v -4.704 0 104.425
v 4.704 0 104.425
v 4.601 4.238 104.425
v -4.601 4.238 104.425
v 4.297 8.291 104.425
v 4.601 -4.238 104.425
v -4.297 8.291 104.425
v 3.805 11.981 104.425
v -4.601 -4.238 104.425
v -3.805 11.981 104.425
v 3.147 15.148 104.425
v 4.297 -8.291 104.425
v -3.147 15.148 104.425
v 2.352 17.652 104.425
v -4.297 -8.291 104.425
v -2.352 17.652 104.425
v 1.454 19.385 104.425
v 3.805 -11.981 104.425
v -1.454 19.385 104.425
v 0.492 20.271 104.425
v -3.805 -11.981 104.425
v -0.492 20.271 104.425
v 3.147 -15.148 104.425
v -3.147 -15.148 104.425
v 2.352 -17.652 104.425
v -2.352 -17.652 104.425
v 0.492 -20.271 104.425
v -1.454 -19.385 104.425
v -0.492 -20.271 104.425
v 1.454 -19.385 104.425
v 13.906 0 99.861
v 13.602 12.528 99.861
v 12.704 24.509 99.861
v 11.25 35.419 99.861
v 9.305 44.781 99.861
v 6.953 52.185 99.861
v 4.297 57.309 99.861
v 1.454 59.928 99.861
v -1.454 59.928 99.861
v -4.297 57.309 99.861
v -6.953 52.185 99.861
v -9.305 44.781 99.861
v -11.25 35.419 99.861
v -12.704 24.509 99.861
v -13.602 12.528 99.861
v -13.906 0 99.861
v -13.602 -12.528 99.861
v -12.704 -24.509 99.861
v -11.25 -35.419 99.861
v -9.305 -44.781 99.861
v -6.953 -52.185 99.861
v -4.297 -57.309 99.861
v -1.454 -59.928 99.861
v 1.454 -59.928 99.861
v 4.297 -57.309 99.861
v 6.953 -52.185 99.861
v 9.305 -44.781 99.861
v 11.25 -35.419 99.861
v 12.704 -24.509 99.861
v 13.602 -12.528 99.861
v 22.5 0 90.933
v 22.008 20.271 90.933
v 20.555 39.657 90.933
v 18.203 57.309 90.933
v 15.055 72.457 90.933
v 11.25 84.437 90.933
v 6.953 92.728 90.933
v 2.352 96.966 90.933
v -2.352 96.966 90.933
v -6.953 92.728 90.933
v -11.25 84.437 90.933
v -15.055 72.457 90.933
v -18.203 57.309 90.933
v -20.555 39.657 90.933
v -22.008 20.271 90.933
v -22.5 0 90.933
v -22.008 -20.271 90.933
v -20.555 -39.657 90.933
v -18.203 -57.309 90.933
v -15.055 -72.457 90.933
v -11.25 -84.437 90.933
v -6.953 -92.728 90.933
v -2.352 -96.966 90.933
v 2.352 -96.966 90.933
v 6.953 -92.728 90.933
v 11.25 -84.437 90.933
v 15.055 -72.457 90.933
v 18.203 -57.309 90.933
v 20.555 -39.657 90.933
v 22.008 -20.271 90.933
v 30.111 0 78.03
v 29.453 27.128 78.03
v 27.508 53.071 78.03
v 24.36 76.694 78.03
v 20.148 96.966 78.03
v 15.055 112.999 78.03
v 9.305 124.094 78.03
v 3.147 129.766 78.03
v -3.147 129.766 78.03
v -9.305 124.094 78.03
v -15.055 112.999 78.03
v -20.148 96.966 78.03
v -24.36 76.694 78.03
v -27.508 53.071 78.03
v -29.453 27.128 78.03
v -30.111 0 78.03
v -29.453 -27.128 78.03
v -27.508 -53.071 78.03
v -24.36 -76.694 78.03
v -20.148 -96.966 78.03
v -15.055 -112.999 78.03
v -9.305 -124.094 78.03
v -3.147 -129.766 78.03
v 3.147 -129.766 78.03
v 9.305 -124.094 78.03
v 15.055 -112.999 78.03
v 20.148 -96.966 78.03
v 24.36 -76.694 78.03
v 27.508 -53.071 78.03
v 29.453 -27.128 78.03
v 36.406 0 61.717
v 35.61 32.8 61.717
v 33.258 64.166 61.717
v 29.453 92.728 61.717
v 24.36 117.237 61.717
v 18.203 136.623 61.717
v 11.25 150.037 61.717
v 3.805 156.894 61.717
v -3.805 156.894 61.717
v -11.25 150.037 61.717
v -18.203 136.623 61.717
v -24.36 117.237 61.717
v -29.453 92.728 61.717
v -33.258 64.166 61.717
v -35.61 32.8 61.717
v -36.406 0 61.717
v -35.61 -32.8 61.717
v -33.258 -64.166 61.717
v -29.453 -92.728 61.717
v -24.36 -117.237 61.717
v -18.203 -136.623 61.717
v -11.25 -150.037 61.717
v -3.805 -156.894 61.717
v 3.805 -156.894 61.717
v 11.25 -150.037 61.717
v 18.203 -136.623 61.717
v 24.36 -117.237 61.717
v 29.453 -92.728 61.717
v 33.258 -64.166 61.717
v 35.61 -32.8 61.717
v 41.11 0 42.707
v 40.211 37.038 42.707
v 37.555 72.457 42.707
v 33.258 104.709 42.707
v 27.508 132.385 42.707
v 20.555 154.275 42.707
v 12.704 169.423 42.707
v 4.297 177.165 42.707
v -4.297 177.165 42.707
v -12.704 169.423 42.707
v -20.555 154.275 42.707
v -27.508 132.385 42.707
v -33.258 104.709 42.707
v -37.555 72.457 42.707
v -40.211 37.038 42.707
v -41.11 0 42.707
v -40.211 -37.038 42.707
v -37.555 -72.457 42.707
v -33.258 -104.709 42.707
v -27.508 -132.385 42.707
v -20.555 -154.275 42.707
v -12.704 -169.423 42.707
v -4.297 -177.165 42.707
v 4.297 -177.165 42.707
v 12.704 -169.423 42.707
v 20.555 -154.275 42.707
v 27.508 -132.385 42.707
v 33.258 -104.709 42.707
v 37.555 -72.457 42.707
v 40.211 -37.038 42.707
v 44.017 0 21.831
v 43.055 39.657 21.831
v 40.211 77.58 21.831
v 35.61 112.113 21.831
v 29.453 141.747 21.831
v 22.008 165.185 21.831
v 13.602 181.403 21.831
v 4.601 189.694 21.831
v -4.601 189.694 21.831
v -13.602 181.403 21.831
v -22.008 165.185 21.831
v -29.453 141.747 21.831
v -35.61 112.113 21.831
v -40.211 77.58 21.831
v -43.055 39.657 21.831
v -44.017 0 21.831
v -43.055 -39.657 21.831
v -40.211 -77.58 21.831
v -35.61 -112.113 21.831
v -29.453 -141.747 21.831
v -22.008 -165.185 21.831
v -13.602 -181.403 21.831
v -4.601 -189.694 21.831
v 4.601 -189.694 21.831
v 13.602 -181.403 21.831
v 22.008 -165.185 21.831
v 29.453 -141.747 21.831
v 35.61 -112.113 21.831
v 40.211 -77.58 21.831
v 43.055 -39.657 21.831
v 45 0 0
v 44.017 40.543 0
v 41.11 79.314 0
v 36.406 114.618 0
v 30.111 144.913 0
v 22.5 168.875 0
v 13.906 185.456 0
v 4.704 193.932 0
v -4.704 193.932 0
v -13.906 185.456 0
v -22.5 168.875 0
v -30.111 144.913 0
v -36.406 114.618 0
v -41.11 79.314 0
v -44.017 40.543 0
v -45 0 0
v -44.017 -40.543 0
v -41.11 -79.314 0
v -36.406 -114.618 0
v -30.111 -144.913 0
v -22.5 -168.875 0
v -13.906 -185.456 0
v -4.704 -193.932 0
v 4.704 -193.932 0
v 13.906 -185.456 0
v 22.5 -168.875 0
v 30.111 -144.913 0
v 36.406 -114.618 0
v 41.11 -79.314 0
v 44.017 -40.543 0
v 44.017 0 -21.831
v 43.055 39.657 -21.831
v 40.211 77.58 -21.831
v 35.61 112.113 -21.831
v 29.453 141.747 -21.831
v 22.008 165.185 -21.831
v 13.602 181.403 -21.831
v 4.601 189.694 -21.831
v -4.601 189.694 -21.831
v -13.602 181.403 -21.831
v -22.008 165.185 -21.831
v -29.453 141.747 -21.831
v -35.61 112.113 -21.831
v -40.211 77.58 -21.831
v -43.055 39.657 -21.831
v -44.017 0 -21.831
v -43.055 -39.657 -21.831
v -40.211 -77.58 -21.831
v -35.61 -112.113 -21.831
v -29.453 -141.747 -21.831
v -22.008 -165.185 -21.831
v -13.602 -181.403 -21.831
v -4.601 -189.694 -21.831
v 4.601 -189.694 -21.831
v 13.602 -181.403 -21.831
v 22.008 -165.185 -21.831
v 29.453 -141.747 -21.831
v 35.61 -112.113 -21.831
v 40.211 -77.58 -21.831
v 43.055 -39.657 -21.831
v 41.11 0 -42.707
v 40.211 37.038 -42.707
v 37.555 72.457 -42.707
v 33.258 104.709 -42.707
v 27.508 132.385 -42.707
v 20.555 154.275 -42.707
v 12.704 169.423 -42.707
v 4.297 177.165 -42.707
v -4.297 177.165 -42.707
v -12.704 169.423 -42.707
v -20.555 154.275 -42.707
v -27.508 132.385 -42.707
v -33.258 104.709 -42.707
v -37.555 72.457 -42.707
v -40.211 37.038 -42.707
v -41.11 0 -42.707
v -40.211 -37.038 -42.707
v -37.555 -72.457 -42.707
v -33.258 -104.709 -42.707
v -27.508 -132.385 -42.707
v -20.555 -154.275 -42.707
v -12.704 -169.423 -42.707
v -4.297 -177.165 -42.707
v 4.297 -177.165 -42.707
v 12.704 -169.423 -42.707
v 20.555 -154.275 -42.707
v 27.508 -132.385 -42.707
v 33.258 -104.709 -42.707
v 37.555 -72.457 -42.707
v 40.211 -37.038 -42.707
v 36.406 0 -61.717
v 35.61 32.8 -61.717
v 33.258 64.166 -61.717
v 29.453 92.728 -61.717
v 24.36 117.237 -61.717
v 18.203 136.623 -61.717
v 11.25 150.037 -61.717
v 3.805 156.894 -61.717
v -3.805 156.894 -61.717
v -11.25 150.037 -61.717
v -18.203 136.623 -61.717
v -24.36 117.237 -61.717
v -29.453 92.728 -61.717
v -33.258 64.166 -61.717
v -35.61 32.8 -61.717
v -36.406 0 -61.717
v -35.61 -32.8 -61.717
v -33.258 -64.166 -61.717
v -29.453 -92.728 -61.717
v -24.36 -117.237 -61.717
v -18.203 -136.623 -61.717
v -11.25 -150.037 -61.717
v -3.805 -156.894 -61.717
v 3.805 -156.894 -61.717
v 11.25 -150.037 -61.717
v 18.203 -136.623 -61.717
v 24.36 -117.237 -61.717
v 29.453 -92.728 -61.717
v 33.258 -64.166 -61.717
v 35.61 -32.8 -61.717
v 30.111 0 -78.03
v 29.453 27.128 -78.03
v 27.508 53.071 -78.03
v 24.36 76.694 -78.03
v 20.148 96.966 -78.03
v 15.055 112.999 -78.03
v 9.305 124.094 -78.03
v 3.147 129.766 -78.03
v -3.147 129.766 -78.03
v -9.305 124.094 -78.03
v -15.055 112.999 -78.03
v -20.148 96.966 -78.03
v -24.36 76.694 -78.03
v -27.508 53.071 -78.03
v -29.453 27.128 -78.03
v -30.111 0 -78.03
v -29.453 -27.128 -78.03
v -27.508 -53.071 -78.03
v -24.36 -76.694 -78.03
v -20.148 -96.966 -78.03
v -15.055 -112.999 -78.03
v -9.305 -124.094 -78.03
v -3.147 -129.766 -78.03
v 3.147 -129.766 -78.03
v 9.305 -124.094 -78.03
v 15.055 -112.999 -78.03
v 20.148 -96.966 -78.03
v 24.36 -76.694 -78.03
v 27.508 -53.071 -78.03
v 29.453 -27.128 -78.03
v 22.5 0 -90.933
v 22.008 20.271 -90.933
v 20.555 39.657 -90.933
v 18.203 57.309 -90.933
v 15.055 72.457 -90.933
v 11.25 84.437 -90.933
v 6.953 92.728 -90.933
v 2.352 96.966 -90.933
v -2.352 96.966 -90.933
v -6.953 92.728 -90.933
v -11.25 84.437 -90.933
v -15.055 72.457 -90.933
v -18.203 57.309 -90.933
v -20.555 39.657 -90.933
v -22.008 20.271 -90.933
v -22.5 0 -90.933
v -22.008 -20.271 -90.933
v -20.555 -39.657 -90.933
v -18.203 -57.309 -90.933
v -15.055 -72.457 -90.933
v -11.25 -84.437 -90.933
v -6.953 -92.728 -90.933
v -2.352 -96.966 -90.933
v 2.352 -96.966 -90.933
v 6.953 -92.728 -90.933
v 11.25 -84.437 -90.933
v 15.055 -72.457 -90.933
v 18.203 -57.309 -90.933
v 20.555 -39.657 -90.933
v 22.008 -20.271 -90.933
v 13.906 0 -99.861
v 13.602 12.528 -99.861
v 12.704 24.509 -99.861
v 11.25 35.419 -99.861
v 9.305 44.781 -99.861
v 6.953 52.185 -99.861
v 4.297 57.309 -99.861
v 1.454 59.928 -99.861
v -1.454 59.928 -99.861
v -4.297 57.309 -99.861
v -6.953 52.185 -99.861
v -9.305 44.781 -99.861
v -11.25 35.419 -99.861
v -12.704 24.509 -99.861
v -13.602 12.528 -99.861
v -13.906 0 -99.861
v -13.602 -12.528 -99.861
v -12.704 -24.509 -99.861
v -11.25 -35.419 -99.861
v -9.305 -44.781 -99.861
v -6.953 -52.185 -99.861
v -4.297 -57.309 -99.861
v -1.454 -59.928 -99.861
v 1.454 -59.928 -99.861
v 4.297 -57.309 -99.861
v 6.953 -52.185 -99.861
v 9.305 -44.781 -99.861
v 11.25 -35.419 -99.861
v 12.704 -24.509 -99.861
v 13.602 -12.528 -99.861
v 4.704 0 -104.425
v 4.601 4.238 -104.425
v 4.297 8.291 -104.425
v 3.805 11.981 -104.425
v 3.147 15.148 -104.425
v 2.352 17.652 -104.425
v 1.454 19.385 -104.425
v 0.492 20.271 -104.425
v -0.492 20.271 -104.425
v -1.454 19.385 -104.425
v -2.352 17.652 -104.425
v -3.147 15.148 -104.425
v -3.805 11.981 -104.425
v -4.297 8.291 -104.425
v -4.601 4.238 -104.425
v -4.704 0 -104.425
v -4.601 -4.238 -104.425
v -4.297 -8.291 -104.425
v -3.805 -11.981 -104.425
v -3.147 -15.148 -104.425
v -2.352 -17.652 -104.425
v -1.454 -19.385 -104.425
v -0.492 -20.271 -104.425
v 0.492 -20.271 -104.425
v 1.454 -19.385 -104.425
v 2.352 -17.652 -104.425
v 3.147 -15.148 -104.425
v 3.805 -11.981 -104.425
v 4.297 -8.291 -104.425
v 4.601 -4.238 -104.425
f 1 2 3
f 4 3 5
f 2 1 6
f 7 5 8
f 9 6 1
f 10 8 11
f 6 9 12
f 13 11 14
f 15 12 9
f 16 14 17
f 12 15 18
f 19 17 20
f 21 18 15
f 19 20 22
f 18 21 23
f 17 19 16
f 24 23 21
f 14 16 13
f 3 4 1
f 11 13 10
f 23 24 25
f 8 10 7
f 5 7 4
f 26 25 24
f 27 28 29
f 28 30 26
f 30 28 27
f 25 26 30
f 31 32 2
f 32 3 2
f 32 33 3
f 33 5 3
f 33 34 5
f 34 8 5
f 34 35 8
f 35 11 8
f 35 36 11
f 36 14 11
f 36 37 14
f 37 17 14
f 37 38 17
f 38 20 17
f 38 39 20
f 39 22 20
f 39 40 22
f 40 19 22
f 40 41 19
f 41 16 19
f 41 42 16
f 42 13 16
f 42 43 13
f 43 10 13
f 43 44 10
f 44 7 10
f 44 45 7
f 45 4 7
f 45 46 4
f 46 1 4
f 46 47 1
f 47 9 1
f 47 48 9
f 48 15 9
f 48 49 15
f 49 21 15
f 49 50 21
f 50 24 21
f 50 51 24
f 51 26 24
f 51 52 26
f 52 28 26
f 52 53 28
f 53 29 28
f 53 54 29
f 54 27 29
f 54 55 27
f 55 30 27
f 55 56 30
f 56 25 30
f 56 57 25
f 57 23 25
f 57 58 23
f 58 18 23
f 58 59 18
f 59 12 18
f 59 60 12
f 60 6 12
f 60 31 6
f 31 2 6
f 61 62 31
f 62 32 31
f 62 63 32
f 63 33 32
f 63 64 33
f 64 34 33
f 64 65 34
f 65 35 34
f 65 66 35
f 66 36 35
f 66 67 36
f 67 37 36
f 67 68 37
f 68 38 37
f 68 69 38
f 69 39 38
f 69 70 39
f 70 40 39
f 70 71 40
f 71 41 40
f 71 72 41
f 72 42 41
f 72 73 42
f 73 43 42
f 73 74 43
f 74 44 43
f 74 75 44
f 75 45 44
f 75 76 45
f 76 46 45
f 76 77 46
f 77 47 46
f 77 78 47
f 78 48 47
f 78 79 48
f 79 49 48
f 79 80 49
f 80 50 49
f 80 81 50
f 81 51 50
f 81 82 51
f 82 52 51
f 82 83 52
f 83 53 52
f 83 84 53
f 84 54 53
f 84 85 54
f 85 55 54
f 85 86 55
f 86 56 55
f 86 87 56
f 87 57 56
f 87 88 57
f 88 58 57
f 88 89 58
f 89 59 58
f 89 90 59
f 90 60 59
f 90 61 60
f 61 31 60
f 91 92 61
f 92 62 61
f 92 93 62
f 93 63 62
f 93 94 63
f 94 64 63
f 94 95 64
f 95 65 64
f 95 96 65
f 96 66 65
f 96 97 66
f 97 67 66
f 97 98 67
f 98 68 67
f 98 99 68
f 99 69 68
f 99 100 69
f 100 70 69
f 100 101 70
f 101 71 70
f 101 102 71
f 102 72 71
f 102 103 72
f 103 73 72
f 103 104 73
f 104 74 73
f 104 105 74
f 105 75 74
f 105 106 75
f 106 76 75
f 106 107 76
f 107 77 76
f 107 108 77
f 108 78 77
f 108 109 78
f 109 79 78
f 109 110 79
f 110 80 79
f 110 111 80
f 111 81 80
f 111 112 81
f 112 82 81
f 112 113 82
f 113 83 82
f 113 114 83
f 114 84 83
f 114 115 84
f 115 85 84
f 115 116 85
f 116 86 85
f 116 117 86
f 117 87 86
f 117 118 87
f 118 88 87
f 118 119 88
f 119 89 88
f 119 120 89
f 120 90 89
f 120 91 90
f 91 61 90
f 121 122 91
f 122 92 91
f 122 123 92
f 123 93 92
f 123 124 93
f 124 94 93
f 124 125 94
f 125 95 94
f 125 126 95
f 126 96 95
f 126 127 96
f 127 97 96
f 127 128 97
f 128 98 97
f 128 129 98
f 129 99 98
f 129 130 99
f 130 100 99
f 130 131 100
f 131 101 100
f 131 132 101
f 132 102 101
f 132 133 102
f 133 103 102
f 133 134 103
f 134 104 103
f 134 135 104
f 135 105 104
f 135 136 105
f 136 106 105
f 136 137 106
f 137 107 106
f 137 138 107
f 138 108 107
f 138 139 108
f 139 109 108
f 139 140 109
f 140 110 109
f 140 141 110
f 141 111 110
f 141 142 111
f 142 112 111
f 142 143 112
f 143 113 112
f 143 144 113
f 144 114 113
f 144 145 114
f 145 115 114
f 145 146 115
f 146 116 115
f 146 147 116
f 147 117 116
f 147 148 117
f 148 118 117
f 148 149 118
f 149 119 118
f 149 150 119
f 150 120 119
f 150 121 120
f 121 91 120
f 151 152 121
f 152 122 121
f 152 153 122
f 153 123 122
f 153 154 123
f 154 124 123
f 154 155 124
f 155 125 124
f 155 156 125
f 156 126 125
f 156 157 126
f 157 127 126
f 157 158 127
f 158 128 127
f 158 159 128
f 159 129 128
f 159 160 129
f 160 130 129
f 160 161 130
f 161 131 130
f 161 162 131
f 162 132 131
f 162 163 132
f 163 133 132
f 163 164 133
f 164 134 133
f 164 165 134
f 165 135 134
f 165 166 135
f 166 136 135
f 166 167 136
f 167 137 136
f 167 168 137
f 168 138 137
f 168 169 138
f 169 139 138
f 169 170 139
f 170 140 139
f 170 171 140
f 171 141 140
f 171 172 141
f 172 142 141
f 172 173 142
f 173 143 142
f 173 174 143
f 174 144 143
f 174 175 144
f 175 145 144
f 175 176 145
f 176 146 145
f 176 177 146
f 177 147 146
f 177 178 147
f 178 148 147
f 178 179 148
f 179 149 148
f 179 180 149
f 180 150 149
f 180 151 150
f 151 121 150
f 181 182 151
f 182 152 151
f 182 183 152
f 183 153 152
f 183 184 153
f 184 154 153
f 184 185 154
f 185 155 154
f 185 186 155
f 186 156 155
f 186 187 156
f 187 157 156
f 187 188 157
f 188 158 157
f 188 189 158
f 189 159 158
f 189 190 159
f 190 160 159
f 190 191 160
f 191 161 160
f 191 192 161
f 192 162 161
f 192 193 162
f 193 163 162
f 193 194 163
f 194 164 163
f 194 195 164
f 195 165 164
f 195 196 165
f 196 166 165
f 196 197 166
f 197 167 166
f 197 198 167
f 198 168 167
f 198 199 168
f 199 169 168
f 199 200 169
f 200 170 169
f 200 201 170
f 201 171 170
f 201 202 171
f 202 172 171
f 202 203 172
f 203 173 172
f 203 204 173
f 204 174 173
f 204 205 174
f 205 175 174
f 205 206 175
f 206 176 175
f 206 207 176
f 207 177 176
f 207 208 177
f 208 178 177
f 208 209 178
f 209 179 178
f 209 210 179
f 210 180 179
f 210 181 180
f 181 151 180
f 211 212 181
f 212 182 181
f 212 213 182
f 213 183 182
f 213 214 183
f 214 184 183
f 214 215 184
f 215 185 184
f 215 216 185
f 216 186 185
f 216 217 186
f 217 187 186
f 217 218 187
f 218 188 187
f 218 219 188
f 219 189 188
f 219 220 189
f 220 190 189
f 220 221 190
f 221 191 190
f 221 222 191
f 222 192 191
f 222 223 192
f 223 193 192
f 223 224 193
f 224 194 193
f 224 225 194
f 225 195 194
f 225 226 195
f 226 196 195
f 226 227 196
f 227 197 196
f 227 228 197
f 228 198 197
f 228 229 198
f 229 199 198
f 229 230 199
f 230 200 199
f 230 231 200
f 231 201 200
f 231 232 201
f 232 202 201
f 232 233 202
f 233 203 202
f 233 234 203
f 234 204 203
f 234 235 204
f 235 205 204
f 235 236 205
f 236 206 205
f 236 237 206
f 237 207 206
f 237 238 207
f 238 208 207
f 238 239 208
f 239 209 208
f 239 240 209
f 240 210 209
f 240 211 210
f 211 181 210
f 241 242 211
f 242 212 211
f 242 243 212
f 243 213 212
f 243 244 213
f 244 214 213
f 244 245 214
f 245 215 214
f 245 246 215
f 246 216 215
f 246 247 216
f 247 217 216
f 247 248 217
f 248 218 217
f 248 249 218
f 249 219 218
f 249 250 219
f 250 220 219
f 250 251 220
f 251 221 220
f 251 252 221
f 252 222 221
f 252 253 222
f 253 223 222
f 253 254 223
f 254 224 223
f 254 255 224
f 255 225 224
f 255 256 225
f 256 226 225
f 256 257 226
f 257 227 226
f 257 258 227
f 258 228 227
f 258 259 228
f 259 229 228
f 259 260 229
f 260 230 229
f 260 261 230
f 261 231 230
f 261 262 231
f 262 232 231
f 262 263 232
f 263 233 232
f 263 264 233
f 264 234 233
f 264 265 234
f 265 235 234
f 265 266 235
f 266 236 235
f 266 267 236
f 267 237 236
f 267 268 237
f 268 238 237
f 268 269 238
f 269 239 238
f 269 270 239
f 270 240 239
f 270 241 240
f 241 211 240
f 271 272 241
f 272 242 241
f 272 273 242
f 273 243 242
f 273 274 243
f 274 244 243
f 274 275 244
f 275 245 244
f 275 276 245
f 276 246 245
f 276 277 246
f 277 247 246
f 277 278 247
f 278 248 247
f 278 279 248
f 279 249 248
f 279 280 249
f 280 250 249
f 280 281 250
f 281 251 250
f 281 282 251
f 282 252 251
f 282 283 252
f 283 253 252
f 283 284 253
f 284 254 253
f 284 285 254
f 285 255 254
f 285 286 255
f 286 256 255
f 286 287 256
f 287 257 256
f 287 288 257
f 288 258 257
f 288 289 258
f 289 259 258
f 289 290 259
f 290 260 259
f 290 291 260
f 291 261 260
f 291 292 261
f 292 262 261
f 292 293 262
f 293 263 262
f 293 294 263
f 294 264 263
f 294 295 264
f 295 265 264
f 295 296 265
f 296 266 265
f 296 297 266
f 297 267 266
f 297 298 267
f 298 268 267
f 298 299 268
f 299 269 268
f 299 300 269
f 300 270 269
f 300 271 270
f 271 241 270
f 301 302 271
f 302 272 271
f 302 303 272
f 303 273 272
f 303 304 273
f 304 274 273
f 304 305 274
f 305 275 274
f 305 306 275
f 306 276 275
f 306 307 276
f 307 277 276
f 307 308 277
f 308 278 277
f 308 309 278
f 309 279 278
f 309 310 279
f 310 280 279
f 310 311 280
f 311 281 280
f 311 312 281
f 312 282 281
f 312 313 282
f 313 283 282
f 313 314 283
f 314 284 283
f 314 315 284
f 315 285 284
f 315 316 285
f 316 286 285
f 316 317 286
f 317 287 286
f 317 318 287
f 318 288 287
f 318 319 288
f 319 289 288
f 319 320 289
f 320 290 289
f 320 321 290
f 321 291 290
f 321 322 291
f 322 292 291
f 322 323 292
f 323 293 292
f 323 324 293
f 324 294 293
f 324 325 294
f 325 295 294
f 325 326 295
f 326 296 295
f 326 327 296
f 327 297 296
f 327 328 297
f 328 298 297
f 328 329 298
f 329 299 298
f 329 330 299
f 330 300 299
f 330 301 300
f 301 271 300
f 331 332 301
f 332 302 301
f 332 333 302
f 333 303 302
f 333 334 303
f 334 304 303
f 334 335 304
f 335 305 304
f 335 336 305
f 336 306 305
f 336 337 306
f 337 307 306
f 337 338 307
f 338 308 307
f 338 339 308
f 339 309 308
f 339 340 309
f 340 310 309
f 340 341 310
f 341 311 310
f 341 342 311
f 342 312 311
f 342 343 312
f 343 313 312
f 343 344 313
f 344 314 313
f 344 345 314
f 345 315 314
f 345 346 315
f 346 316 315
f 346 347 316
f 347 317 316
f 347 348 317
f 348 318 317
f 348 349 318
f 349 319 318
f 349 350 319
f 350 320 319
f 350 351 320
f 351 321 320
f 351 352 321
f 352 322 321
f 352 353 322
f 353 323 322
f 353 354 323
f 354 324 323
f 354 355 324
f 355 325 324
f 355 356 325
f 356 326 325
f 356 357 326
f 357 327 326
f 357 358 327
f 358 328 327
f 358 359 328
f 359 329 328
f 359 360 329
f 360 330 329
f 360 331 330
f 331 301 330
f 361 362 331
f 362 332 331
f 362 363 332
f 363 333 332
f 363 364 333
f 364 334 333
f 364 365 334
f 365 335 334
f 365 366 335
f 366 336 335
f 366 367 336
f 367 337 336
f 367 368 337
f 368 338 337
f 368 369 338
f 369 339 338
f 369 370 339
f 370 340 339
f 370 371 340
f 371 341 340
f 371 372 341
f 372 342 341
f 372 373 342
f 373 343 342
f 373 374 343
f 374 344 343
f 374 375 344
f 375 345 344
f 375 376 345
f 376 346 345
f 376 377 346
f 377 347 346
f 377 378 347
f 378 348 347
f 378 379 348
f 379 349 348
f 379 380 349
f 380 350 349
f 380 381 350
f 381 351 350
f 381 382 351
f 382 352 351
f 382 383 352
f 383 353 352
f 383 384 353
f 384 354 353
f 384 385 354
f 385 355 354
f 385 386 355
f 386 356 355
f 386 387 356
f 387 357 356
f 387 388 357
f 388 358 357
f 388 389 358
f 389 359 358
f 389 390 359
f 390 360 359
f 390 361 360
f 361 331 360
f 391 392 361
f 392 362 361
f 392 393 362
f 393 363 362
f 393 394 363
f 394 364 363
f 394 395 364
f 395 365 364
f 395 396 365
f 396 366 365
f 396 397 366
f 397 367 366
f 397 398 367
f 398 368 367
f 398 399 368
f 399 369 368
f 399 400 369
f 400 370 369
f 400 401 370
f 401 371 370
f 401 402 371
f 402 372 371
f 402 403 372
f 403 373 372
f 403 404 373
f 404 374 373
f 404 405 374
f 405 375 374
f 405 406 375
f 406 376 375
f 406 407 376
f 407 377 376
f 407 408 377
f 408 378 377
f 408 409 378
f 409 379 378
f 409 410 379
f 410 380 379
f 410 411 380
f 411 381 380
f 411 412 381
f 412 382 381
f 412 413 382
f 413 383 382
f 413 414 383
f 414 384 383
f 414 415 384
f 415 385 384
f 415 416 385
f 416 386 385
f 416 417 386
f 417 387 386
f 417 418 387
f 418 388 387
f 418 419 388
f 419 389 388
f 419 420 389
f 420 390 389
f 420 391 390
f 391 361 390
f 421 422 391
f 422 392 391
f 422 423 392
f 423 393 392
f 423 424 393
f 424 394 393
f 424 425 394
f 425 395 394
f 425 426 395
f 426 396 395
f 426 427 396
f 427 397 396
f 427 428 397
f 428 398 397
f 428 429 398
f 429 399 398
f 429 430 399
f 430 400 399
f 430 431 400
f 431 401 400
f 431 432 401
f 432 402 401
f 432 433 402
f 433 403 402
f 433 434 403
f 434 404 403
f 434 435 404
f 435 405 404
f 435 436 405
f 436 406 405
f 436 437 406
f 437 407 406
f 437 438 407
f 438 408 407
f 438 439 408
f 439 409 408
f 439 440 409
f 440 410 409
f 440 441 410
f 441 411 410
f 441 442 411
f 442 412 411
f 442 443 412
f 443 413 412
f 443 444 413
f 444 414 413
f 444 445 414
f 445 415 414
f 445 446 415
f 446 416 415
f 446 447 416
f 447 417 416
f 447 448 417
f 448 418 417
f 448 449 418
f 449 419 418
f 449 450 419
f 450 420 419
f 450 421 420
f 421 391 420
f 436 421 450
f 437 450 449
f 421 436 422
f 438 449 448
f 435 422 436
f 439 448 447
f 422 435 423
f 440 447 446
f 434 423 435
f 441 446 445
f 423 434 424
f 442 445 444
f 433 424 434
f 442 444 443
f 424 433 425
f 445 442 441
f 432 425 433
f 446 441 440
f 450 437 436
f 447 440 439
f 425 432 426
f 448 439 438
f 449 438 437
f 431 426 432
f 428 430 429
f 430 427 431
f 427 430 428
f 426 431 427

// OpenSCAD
// Generated by SolidPython 1.0.1 on 2020-07-29 00:46:45


scale(v = [3, 13, 7]) {
	sphere(r = 15);
}
/***********************************************
*********      SolidPython code:      **********
************************************************
 
# import packages: SolidPython
from solid import *
from solid.utils import *
from itertools import chain, combinations, permutations


class Resize:

    def __init__(self, scad_file):
        self.scad_file = scad_file
        #self.scad_file = import_scad(scad_file)
        # cone/cylinder param:
        self.r1 = 0
        self.r2 = 0
        self.h = 0
        # rectangular prism param:
        self.w = 0
        self.l = 0
        # ellipse param:
        self.r = 0

    # import OpenScad code (file name corresponds to shape)


    # classify shape + parameters
    def assign(self, param1, param2, param3):
        if self.scad_file == 'cone.scad':
            self.r1 = param1
            self.r2 = param2
            self.h = param3
        elif self.scad_file == 'cylinder.scad':
            self.r1 = param1
            self.r2 = param2
            self.h = param3
        elif self.scad_file == 'rectangularPrism.scad':
            self.h = param1
            self.l = param2
            self.w = param3
        else:
            self.r = param1
            self.h = param2

    # resize parameters
    def iterate(self):
        x = range(3, 20, 2)
        i = 1
        if self.scad_file == 'cone.scad':
            tempList = list(permutations(x, 2))
            for temp in tempList:
                param1 = temp[0]
                param2 = temp[1]
                filepath = 'produced_scad_files/' + 'cone' + str(param1) + '_' + str(param2) + '_' + '.scad'
                scad_render_to_file(cylinder(h=param1, r1=param2, r2=0), filepath)

        elif self.scad_file == 'cylinder.scad':
            tempList = list(permutations(x, 3))
            for temp in tempList:
                param1 = temp[0]
                param2 = temp[1]
                filepath = 'produced_scad_files/' + 'cylinder' + str(param1) + '_' + str(param2) + '_' + '.scad'
                scad_render_to_file(cylinder(h=param1, r1=param2, r2=param2), filepath)

        elif self.scad_file == 'rectangularPrism.scad':
            tempList = list(permutations(x, 3))
            for temp in tempList:
                param1 = temp[0]
                param2 = temp[1]
                param3 = temp[2]
                filepath = 'produced_scad_files/' + 'rectangularPrism' + str(param1) + '_' + str(param2) + '_' + str(
                    param3) + '.scad'
                scad_render_to_file(cube(size=(param1, param2, param3)), filepath)

        elif self.scad_file == 'ellipse.scad':
            tempList = list(permutations(x, 4))
            for temp in tempList:
                param1 = temp[0]
                param2 = temp[1]
                param3 = temp[2]
                param4 = temp[3]
                filepath = 'produced_scad_files/' + 'ellipse' + str(param1) + '_' + str(param2) + '_' + str(param3) + '_' + str(param4) + '.scad'
                scad_render_to_file(scale([param1, param2, param3])(sphere(r=param4)), filepath)

    def render_to_scadfile(self):
        scad_render_to_file(scad, 'example.scad') 
 
************************************************/
